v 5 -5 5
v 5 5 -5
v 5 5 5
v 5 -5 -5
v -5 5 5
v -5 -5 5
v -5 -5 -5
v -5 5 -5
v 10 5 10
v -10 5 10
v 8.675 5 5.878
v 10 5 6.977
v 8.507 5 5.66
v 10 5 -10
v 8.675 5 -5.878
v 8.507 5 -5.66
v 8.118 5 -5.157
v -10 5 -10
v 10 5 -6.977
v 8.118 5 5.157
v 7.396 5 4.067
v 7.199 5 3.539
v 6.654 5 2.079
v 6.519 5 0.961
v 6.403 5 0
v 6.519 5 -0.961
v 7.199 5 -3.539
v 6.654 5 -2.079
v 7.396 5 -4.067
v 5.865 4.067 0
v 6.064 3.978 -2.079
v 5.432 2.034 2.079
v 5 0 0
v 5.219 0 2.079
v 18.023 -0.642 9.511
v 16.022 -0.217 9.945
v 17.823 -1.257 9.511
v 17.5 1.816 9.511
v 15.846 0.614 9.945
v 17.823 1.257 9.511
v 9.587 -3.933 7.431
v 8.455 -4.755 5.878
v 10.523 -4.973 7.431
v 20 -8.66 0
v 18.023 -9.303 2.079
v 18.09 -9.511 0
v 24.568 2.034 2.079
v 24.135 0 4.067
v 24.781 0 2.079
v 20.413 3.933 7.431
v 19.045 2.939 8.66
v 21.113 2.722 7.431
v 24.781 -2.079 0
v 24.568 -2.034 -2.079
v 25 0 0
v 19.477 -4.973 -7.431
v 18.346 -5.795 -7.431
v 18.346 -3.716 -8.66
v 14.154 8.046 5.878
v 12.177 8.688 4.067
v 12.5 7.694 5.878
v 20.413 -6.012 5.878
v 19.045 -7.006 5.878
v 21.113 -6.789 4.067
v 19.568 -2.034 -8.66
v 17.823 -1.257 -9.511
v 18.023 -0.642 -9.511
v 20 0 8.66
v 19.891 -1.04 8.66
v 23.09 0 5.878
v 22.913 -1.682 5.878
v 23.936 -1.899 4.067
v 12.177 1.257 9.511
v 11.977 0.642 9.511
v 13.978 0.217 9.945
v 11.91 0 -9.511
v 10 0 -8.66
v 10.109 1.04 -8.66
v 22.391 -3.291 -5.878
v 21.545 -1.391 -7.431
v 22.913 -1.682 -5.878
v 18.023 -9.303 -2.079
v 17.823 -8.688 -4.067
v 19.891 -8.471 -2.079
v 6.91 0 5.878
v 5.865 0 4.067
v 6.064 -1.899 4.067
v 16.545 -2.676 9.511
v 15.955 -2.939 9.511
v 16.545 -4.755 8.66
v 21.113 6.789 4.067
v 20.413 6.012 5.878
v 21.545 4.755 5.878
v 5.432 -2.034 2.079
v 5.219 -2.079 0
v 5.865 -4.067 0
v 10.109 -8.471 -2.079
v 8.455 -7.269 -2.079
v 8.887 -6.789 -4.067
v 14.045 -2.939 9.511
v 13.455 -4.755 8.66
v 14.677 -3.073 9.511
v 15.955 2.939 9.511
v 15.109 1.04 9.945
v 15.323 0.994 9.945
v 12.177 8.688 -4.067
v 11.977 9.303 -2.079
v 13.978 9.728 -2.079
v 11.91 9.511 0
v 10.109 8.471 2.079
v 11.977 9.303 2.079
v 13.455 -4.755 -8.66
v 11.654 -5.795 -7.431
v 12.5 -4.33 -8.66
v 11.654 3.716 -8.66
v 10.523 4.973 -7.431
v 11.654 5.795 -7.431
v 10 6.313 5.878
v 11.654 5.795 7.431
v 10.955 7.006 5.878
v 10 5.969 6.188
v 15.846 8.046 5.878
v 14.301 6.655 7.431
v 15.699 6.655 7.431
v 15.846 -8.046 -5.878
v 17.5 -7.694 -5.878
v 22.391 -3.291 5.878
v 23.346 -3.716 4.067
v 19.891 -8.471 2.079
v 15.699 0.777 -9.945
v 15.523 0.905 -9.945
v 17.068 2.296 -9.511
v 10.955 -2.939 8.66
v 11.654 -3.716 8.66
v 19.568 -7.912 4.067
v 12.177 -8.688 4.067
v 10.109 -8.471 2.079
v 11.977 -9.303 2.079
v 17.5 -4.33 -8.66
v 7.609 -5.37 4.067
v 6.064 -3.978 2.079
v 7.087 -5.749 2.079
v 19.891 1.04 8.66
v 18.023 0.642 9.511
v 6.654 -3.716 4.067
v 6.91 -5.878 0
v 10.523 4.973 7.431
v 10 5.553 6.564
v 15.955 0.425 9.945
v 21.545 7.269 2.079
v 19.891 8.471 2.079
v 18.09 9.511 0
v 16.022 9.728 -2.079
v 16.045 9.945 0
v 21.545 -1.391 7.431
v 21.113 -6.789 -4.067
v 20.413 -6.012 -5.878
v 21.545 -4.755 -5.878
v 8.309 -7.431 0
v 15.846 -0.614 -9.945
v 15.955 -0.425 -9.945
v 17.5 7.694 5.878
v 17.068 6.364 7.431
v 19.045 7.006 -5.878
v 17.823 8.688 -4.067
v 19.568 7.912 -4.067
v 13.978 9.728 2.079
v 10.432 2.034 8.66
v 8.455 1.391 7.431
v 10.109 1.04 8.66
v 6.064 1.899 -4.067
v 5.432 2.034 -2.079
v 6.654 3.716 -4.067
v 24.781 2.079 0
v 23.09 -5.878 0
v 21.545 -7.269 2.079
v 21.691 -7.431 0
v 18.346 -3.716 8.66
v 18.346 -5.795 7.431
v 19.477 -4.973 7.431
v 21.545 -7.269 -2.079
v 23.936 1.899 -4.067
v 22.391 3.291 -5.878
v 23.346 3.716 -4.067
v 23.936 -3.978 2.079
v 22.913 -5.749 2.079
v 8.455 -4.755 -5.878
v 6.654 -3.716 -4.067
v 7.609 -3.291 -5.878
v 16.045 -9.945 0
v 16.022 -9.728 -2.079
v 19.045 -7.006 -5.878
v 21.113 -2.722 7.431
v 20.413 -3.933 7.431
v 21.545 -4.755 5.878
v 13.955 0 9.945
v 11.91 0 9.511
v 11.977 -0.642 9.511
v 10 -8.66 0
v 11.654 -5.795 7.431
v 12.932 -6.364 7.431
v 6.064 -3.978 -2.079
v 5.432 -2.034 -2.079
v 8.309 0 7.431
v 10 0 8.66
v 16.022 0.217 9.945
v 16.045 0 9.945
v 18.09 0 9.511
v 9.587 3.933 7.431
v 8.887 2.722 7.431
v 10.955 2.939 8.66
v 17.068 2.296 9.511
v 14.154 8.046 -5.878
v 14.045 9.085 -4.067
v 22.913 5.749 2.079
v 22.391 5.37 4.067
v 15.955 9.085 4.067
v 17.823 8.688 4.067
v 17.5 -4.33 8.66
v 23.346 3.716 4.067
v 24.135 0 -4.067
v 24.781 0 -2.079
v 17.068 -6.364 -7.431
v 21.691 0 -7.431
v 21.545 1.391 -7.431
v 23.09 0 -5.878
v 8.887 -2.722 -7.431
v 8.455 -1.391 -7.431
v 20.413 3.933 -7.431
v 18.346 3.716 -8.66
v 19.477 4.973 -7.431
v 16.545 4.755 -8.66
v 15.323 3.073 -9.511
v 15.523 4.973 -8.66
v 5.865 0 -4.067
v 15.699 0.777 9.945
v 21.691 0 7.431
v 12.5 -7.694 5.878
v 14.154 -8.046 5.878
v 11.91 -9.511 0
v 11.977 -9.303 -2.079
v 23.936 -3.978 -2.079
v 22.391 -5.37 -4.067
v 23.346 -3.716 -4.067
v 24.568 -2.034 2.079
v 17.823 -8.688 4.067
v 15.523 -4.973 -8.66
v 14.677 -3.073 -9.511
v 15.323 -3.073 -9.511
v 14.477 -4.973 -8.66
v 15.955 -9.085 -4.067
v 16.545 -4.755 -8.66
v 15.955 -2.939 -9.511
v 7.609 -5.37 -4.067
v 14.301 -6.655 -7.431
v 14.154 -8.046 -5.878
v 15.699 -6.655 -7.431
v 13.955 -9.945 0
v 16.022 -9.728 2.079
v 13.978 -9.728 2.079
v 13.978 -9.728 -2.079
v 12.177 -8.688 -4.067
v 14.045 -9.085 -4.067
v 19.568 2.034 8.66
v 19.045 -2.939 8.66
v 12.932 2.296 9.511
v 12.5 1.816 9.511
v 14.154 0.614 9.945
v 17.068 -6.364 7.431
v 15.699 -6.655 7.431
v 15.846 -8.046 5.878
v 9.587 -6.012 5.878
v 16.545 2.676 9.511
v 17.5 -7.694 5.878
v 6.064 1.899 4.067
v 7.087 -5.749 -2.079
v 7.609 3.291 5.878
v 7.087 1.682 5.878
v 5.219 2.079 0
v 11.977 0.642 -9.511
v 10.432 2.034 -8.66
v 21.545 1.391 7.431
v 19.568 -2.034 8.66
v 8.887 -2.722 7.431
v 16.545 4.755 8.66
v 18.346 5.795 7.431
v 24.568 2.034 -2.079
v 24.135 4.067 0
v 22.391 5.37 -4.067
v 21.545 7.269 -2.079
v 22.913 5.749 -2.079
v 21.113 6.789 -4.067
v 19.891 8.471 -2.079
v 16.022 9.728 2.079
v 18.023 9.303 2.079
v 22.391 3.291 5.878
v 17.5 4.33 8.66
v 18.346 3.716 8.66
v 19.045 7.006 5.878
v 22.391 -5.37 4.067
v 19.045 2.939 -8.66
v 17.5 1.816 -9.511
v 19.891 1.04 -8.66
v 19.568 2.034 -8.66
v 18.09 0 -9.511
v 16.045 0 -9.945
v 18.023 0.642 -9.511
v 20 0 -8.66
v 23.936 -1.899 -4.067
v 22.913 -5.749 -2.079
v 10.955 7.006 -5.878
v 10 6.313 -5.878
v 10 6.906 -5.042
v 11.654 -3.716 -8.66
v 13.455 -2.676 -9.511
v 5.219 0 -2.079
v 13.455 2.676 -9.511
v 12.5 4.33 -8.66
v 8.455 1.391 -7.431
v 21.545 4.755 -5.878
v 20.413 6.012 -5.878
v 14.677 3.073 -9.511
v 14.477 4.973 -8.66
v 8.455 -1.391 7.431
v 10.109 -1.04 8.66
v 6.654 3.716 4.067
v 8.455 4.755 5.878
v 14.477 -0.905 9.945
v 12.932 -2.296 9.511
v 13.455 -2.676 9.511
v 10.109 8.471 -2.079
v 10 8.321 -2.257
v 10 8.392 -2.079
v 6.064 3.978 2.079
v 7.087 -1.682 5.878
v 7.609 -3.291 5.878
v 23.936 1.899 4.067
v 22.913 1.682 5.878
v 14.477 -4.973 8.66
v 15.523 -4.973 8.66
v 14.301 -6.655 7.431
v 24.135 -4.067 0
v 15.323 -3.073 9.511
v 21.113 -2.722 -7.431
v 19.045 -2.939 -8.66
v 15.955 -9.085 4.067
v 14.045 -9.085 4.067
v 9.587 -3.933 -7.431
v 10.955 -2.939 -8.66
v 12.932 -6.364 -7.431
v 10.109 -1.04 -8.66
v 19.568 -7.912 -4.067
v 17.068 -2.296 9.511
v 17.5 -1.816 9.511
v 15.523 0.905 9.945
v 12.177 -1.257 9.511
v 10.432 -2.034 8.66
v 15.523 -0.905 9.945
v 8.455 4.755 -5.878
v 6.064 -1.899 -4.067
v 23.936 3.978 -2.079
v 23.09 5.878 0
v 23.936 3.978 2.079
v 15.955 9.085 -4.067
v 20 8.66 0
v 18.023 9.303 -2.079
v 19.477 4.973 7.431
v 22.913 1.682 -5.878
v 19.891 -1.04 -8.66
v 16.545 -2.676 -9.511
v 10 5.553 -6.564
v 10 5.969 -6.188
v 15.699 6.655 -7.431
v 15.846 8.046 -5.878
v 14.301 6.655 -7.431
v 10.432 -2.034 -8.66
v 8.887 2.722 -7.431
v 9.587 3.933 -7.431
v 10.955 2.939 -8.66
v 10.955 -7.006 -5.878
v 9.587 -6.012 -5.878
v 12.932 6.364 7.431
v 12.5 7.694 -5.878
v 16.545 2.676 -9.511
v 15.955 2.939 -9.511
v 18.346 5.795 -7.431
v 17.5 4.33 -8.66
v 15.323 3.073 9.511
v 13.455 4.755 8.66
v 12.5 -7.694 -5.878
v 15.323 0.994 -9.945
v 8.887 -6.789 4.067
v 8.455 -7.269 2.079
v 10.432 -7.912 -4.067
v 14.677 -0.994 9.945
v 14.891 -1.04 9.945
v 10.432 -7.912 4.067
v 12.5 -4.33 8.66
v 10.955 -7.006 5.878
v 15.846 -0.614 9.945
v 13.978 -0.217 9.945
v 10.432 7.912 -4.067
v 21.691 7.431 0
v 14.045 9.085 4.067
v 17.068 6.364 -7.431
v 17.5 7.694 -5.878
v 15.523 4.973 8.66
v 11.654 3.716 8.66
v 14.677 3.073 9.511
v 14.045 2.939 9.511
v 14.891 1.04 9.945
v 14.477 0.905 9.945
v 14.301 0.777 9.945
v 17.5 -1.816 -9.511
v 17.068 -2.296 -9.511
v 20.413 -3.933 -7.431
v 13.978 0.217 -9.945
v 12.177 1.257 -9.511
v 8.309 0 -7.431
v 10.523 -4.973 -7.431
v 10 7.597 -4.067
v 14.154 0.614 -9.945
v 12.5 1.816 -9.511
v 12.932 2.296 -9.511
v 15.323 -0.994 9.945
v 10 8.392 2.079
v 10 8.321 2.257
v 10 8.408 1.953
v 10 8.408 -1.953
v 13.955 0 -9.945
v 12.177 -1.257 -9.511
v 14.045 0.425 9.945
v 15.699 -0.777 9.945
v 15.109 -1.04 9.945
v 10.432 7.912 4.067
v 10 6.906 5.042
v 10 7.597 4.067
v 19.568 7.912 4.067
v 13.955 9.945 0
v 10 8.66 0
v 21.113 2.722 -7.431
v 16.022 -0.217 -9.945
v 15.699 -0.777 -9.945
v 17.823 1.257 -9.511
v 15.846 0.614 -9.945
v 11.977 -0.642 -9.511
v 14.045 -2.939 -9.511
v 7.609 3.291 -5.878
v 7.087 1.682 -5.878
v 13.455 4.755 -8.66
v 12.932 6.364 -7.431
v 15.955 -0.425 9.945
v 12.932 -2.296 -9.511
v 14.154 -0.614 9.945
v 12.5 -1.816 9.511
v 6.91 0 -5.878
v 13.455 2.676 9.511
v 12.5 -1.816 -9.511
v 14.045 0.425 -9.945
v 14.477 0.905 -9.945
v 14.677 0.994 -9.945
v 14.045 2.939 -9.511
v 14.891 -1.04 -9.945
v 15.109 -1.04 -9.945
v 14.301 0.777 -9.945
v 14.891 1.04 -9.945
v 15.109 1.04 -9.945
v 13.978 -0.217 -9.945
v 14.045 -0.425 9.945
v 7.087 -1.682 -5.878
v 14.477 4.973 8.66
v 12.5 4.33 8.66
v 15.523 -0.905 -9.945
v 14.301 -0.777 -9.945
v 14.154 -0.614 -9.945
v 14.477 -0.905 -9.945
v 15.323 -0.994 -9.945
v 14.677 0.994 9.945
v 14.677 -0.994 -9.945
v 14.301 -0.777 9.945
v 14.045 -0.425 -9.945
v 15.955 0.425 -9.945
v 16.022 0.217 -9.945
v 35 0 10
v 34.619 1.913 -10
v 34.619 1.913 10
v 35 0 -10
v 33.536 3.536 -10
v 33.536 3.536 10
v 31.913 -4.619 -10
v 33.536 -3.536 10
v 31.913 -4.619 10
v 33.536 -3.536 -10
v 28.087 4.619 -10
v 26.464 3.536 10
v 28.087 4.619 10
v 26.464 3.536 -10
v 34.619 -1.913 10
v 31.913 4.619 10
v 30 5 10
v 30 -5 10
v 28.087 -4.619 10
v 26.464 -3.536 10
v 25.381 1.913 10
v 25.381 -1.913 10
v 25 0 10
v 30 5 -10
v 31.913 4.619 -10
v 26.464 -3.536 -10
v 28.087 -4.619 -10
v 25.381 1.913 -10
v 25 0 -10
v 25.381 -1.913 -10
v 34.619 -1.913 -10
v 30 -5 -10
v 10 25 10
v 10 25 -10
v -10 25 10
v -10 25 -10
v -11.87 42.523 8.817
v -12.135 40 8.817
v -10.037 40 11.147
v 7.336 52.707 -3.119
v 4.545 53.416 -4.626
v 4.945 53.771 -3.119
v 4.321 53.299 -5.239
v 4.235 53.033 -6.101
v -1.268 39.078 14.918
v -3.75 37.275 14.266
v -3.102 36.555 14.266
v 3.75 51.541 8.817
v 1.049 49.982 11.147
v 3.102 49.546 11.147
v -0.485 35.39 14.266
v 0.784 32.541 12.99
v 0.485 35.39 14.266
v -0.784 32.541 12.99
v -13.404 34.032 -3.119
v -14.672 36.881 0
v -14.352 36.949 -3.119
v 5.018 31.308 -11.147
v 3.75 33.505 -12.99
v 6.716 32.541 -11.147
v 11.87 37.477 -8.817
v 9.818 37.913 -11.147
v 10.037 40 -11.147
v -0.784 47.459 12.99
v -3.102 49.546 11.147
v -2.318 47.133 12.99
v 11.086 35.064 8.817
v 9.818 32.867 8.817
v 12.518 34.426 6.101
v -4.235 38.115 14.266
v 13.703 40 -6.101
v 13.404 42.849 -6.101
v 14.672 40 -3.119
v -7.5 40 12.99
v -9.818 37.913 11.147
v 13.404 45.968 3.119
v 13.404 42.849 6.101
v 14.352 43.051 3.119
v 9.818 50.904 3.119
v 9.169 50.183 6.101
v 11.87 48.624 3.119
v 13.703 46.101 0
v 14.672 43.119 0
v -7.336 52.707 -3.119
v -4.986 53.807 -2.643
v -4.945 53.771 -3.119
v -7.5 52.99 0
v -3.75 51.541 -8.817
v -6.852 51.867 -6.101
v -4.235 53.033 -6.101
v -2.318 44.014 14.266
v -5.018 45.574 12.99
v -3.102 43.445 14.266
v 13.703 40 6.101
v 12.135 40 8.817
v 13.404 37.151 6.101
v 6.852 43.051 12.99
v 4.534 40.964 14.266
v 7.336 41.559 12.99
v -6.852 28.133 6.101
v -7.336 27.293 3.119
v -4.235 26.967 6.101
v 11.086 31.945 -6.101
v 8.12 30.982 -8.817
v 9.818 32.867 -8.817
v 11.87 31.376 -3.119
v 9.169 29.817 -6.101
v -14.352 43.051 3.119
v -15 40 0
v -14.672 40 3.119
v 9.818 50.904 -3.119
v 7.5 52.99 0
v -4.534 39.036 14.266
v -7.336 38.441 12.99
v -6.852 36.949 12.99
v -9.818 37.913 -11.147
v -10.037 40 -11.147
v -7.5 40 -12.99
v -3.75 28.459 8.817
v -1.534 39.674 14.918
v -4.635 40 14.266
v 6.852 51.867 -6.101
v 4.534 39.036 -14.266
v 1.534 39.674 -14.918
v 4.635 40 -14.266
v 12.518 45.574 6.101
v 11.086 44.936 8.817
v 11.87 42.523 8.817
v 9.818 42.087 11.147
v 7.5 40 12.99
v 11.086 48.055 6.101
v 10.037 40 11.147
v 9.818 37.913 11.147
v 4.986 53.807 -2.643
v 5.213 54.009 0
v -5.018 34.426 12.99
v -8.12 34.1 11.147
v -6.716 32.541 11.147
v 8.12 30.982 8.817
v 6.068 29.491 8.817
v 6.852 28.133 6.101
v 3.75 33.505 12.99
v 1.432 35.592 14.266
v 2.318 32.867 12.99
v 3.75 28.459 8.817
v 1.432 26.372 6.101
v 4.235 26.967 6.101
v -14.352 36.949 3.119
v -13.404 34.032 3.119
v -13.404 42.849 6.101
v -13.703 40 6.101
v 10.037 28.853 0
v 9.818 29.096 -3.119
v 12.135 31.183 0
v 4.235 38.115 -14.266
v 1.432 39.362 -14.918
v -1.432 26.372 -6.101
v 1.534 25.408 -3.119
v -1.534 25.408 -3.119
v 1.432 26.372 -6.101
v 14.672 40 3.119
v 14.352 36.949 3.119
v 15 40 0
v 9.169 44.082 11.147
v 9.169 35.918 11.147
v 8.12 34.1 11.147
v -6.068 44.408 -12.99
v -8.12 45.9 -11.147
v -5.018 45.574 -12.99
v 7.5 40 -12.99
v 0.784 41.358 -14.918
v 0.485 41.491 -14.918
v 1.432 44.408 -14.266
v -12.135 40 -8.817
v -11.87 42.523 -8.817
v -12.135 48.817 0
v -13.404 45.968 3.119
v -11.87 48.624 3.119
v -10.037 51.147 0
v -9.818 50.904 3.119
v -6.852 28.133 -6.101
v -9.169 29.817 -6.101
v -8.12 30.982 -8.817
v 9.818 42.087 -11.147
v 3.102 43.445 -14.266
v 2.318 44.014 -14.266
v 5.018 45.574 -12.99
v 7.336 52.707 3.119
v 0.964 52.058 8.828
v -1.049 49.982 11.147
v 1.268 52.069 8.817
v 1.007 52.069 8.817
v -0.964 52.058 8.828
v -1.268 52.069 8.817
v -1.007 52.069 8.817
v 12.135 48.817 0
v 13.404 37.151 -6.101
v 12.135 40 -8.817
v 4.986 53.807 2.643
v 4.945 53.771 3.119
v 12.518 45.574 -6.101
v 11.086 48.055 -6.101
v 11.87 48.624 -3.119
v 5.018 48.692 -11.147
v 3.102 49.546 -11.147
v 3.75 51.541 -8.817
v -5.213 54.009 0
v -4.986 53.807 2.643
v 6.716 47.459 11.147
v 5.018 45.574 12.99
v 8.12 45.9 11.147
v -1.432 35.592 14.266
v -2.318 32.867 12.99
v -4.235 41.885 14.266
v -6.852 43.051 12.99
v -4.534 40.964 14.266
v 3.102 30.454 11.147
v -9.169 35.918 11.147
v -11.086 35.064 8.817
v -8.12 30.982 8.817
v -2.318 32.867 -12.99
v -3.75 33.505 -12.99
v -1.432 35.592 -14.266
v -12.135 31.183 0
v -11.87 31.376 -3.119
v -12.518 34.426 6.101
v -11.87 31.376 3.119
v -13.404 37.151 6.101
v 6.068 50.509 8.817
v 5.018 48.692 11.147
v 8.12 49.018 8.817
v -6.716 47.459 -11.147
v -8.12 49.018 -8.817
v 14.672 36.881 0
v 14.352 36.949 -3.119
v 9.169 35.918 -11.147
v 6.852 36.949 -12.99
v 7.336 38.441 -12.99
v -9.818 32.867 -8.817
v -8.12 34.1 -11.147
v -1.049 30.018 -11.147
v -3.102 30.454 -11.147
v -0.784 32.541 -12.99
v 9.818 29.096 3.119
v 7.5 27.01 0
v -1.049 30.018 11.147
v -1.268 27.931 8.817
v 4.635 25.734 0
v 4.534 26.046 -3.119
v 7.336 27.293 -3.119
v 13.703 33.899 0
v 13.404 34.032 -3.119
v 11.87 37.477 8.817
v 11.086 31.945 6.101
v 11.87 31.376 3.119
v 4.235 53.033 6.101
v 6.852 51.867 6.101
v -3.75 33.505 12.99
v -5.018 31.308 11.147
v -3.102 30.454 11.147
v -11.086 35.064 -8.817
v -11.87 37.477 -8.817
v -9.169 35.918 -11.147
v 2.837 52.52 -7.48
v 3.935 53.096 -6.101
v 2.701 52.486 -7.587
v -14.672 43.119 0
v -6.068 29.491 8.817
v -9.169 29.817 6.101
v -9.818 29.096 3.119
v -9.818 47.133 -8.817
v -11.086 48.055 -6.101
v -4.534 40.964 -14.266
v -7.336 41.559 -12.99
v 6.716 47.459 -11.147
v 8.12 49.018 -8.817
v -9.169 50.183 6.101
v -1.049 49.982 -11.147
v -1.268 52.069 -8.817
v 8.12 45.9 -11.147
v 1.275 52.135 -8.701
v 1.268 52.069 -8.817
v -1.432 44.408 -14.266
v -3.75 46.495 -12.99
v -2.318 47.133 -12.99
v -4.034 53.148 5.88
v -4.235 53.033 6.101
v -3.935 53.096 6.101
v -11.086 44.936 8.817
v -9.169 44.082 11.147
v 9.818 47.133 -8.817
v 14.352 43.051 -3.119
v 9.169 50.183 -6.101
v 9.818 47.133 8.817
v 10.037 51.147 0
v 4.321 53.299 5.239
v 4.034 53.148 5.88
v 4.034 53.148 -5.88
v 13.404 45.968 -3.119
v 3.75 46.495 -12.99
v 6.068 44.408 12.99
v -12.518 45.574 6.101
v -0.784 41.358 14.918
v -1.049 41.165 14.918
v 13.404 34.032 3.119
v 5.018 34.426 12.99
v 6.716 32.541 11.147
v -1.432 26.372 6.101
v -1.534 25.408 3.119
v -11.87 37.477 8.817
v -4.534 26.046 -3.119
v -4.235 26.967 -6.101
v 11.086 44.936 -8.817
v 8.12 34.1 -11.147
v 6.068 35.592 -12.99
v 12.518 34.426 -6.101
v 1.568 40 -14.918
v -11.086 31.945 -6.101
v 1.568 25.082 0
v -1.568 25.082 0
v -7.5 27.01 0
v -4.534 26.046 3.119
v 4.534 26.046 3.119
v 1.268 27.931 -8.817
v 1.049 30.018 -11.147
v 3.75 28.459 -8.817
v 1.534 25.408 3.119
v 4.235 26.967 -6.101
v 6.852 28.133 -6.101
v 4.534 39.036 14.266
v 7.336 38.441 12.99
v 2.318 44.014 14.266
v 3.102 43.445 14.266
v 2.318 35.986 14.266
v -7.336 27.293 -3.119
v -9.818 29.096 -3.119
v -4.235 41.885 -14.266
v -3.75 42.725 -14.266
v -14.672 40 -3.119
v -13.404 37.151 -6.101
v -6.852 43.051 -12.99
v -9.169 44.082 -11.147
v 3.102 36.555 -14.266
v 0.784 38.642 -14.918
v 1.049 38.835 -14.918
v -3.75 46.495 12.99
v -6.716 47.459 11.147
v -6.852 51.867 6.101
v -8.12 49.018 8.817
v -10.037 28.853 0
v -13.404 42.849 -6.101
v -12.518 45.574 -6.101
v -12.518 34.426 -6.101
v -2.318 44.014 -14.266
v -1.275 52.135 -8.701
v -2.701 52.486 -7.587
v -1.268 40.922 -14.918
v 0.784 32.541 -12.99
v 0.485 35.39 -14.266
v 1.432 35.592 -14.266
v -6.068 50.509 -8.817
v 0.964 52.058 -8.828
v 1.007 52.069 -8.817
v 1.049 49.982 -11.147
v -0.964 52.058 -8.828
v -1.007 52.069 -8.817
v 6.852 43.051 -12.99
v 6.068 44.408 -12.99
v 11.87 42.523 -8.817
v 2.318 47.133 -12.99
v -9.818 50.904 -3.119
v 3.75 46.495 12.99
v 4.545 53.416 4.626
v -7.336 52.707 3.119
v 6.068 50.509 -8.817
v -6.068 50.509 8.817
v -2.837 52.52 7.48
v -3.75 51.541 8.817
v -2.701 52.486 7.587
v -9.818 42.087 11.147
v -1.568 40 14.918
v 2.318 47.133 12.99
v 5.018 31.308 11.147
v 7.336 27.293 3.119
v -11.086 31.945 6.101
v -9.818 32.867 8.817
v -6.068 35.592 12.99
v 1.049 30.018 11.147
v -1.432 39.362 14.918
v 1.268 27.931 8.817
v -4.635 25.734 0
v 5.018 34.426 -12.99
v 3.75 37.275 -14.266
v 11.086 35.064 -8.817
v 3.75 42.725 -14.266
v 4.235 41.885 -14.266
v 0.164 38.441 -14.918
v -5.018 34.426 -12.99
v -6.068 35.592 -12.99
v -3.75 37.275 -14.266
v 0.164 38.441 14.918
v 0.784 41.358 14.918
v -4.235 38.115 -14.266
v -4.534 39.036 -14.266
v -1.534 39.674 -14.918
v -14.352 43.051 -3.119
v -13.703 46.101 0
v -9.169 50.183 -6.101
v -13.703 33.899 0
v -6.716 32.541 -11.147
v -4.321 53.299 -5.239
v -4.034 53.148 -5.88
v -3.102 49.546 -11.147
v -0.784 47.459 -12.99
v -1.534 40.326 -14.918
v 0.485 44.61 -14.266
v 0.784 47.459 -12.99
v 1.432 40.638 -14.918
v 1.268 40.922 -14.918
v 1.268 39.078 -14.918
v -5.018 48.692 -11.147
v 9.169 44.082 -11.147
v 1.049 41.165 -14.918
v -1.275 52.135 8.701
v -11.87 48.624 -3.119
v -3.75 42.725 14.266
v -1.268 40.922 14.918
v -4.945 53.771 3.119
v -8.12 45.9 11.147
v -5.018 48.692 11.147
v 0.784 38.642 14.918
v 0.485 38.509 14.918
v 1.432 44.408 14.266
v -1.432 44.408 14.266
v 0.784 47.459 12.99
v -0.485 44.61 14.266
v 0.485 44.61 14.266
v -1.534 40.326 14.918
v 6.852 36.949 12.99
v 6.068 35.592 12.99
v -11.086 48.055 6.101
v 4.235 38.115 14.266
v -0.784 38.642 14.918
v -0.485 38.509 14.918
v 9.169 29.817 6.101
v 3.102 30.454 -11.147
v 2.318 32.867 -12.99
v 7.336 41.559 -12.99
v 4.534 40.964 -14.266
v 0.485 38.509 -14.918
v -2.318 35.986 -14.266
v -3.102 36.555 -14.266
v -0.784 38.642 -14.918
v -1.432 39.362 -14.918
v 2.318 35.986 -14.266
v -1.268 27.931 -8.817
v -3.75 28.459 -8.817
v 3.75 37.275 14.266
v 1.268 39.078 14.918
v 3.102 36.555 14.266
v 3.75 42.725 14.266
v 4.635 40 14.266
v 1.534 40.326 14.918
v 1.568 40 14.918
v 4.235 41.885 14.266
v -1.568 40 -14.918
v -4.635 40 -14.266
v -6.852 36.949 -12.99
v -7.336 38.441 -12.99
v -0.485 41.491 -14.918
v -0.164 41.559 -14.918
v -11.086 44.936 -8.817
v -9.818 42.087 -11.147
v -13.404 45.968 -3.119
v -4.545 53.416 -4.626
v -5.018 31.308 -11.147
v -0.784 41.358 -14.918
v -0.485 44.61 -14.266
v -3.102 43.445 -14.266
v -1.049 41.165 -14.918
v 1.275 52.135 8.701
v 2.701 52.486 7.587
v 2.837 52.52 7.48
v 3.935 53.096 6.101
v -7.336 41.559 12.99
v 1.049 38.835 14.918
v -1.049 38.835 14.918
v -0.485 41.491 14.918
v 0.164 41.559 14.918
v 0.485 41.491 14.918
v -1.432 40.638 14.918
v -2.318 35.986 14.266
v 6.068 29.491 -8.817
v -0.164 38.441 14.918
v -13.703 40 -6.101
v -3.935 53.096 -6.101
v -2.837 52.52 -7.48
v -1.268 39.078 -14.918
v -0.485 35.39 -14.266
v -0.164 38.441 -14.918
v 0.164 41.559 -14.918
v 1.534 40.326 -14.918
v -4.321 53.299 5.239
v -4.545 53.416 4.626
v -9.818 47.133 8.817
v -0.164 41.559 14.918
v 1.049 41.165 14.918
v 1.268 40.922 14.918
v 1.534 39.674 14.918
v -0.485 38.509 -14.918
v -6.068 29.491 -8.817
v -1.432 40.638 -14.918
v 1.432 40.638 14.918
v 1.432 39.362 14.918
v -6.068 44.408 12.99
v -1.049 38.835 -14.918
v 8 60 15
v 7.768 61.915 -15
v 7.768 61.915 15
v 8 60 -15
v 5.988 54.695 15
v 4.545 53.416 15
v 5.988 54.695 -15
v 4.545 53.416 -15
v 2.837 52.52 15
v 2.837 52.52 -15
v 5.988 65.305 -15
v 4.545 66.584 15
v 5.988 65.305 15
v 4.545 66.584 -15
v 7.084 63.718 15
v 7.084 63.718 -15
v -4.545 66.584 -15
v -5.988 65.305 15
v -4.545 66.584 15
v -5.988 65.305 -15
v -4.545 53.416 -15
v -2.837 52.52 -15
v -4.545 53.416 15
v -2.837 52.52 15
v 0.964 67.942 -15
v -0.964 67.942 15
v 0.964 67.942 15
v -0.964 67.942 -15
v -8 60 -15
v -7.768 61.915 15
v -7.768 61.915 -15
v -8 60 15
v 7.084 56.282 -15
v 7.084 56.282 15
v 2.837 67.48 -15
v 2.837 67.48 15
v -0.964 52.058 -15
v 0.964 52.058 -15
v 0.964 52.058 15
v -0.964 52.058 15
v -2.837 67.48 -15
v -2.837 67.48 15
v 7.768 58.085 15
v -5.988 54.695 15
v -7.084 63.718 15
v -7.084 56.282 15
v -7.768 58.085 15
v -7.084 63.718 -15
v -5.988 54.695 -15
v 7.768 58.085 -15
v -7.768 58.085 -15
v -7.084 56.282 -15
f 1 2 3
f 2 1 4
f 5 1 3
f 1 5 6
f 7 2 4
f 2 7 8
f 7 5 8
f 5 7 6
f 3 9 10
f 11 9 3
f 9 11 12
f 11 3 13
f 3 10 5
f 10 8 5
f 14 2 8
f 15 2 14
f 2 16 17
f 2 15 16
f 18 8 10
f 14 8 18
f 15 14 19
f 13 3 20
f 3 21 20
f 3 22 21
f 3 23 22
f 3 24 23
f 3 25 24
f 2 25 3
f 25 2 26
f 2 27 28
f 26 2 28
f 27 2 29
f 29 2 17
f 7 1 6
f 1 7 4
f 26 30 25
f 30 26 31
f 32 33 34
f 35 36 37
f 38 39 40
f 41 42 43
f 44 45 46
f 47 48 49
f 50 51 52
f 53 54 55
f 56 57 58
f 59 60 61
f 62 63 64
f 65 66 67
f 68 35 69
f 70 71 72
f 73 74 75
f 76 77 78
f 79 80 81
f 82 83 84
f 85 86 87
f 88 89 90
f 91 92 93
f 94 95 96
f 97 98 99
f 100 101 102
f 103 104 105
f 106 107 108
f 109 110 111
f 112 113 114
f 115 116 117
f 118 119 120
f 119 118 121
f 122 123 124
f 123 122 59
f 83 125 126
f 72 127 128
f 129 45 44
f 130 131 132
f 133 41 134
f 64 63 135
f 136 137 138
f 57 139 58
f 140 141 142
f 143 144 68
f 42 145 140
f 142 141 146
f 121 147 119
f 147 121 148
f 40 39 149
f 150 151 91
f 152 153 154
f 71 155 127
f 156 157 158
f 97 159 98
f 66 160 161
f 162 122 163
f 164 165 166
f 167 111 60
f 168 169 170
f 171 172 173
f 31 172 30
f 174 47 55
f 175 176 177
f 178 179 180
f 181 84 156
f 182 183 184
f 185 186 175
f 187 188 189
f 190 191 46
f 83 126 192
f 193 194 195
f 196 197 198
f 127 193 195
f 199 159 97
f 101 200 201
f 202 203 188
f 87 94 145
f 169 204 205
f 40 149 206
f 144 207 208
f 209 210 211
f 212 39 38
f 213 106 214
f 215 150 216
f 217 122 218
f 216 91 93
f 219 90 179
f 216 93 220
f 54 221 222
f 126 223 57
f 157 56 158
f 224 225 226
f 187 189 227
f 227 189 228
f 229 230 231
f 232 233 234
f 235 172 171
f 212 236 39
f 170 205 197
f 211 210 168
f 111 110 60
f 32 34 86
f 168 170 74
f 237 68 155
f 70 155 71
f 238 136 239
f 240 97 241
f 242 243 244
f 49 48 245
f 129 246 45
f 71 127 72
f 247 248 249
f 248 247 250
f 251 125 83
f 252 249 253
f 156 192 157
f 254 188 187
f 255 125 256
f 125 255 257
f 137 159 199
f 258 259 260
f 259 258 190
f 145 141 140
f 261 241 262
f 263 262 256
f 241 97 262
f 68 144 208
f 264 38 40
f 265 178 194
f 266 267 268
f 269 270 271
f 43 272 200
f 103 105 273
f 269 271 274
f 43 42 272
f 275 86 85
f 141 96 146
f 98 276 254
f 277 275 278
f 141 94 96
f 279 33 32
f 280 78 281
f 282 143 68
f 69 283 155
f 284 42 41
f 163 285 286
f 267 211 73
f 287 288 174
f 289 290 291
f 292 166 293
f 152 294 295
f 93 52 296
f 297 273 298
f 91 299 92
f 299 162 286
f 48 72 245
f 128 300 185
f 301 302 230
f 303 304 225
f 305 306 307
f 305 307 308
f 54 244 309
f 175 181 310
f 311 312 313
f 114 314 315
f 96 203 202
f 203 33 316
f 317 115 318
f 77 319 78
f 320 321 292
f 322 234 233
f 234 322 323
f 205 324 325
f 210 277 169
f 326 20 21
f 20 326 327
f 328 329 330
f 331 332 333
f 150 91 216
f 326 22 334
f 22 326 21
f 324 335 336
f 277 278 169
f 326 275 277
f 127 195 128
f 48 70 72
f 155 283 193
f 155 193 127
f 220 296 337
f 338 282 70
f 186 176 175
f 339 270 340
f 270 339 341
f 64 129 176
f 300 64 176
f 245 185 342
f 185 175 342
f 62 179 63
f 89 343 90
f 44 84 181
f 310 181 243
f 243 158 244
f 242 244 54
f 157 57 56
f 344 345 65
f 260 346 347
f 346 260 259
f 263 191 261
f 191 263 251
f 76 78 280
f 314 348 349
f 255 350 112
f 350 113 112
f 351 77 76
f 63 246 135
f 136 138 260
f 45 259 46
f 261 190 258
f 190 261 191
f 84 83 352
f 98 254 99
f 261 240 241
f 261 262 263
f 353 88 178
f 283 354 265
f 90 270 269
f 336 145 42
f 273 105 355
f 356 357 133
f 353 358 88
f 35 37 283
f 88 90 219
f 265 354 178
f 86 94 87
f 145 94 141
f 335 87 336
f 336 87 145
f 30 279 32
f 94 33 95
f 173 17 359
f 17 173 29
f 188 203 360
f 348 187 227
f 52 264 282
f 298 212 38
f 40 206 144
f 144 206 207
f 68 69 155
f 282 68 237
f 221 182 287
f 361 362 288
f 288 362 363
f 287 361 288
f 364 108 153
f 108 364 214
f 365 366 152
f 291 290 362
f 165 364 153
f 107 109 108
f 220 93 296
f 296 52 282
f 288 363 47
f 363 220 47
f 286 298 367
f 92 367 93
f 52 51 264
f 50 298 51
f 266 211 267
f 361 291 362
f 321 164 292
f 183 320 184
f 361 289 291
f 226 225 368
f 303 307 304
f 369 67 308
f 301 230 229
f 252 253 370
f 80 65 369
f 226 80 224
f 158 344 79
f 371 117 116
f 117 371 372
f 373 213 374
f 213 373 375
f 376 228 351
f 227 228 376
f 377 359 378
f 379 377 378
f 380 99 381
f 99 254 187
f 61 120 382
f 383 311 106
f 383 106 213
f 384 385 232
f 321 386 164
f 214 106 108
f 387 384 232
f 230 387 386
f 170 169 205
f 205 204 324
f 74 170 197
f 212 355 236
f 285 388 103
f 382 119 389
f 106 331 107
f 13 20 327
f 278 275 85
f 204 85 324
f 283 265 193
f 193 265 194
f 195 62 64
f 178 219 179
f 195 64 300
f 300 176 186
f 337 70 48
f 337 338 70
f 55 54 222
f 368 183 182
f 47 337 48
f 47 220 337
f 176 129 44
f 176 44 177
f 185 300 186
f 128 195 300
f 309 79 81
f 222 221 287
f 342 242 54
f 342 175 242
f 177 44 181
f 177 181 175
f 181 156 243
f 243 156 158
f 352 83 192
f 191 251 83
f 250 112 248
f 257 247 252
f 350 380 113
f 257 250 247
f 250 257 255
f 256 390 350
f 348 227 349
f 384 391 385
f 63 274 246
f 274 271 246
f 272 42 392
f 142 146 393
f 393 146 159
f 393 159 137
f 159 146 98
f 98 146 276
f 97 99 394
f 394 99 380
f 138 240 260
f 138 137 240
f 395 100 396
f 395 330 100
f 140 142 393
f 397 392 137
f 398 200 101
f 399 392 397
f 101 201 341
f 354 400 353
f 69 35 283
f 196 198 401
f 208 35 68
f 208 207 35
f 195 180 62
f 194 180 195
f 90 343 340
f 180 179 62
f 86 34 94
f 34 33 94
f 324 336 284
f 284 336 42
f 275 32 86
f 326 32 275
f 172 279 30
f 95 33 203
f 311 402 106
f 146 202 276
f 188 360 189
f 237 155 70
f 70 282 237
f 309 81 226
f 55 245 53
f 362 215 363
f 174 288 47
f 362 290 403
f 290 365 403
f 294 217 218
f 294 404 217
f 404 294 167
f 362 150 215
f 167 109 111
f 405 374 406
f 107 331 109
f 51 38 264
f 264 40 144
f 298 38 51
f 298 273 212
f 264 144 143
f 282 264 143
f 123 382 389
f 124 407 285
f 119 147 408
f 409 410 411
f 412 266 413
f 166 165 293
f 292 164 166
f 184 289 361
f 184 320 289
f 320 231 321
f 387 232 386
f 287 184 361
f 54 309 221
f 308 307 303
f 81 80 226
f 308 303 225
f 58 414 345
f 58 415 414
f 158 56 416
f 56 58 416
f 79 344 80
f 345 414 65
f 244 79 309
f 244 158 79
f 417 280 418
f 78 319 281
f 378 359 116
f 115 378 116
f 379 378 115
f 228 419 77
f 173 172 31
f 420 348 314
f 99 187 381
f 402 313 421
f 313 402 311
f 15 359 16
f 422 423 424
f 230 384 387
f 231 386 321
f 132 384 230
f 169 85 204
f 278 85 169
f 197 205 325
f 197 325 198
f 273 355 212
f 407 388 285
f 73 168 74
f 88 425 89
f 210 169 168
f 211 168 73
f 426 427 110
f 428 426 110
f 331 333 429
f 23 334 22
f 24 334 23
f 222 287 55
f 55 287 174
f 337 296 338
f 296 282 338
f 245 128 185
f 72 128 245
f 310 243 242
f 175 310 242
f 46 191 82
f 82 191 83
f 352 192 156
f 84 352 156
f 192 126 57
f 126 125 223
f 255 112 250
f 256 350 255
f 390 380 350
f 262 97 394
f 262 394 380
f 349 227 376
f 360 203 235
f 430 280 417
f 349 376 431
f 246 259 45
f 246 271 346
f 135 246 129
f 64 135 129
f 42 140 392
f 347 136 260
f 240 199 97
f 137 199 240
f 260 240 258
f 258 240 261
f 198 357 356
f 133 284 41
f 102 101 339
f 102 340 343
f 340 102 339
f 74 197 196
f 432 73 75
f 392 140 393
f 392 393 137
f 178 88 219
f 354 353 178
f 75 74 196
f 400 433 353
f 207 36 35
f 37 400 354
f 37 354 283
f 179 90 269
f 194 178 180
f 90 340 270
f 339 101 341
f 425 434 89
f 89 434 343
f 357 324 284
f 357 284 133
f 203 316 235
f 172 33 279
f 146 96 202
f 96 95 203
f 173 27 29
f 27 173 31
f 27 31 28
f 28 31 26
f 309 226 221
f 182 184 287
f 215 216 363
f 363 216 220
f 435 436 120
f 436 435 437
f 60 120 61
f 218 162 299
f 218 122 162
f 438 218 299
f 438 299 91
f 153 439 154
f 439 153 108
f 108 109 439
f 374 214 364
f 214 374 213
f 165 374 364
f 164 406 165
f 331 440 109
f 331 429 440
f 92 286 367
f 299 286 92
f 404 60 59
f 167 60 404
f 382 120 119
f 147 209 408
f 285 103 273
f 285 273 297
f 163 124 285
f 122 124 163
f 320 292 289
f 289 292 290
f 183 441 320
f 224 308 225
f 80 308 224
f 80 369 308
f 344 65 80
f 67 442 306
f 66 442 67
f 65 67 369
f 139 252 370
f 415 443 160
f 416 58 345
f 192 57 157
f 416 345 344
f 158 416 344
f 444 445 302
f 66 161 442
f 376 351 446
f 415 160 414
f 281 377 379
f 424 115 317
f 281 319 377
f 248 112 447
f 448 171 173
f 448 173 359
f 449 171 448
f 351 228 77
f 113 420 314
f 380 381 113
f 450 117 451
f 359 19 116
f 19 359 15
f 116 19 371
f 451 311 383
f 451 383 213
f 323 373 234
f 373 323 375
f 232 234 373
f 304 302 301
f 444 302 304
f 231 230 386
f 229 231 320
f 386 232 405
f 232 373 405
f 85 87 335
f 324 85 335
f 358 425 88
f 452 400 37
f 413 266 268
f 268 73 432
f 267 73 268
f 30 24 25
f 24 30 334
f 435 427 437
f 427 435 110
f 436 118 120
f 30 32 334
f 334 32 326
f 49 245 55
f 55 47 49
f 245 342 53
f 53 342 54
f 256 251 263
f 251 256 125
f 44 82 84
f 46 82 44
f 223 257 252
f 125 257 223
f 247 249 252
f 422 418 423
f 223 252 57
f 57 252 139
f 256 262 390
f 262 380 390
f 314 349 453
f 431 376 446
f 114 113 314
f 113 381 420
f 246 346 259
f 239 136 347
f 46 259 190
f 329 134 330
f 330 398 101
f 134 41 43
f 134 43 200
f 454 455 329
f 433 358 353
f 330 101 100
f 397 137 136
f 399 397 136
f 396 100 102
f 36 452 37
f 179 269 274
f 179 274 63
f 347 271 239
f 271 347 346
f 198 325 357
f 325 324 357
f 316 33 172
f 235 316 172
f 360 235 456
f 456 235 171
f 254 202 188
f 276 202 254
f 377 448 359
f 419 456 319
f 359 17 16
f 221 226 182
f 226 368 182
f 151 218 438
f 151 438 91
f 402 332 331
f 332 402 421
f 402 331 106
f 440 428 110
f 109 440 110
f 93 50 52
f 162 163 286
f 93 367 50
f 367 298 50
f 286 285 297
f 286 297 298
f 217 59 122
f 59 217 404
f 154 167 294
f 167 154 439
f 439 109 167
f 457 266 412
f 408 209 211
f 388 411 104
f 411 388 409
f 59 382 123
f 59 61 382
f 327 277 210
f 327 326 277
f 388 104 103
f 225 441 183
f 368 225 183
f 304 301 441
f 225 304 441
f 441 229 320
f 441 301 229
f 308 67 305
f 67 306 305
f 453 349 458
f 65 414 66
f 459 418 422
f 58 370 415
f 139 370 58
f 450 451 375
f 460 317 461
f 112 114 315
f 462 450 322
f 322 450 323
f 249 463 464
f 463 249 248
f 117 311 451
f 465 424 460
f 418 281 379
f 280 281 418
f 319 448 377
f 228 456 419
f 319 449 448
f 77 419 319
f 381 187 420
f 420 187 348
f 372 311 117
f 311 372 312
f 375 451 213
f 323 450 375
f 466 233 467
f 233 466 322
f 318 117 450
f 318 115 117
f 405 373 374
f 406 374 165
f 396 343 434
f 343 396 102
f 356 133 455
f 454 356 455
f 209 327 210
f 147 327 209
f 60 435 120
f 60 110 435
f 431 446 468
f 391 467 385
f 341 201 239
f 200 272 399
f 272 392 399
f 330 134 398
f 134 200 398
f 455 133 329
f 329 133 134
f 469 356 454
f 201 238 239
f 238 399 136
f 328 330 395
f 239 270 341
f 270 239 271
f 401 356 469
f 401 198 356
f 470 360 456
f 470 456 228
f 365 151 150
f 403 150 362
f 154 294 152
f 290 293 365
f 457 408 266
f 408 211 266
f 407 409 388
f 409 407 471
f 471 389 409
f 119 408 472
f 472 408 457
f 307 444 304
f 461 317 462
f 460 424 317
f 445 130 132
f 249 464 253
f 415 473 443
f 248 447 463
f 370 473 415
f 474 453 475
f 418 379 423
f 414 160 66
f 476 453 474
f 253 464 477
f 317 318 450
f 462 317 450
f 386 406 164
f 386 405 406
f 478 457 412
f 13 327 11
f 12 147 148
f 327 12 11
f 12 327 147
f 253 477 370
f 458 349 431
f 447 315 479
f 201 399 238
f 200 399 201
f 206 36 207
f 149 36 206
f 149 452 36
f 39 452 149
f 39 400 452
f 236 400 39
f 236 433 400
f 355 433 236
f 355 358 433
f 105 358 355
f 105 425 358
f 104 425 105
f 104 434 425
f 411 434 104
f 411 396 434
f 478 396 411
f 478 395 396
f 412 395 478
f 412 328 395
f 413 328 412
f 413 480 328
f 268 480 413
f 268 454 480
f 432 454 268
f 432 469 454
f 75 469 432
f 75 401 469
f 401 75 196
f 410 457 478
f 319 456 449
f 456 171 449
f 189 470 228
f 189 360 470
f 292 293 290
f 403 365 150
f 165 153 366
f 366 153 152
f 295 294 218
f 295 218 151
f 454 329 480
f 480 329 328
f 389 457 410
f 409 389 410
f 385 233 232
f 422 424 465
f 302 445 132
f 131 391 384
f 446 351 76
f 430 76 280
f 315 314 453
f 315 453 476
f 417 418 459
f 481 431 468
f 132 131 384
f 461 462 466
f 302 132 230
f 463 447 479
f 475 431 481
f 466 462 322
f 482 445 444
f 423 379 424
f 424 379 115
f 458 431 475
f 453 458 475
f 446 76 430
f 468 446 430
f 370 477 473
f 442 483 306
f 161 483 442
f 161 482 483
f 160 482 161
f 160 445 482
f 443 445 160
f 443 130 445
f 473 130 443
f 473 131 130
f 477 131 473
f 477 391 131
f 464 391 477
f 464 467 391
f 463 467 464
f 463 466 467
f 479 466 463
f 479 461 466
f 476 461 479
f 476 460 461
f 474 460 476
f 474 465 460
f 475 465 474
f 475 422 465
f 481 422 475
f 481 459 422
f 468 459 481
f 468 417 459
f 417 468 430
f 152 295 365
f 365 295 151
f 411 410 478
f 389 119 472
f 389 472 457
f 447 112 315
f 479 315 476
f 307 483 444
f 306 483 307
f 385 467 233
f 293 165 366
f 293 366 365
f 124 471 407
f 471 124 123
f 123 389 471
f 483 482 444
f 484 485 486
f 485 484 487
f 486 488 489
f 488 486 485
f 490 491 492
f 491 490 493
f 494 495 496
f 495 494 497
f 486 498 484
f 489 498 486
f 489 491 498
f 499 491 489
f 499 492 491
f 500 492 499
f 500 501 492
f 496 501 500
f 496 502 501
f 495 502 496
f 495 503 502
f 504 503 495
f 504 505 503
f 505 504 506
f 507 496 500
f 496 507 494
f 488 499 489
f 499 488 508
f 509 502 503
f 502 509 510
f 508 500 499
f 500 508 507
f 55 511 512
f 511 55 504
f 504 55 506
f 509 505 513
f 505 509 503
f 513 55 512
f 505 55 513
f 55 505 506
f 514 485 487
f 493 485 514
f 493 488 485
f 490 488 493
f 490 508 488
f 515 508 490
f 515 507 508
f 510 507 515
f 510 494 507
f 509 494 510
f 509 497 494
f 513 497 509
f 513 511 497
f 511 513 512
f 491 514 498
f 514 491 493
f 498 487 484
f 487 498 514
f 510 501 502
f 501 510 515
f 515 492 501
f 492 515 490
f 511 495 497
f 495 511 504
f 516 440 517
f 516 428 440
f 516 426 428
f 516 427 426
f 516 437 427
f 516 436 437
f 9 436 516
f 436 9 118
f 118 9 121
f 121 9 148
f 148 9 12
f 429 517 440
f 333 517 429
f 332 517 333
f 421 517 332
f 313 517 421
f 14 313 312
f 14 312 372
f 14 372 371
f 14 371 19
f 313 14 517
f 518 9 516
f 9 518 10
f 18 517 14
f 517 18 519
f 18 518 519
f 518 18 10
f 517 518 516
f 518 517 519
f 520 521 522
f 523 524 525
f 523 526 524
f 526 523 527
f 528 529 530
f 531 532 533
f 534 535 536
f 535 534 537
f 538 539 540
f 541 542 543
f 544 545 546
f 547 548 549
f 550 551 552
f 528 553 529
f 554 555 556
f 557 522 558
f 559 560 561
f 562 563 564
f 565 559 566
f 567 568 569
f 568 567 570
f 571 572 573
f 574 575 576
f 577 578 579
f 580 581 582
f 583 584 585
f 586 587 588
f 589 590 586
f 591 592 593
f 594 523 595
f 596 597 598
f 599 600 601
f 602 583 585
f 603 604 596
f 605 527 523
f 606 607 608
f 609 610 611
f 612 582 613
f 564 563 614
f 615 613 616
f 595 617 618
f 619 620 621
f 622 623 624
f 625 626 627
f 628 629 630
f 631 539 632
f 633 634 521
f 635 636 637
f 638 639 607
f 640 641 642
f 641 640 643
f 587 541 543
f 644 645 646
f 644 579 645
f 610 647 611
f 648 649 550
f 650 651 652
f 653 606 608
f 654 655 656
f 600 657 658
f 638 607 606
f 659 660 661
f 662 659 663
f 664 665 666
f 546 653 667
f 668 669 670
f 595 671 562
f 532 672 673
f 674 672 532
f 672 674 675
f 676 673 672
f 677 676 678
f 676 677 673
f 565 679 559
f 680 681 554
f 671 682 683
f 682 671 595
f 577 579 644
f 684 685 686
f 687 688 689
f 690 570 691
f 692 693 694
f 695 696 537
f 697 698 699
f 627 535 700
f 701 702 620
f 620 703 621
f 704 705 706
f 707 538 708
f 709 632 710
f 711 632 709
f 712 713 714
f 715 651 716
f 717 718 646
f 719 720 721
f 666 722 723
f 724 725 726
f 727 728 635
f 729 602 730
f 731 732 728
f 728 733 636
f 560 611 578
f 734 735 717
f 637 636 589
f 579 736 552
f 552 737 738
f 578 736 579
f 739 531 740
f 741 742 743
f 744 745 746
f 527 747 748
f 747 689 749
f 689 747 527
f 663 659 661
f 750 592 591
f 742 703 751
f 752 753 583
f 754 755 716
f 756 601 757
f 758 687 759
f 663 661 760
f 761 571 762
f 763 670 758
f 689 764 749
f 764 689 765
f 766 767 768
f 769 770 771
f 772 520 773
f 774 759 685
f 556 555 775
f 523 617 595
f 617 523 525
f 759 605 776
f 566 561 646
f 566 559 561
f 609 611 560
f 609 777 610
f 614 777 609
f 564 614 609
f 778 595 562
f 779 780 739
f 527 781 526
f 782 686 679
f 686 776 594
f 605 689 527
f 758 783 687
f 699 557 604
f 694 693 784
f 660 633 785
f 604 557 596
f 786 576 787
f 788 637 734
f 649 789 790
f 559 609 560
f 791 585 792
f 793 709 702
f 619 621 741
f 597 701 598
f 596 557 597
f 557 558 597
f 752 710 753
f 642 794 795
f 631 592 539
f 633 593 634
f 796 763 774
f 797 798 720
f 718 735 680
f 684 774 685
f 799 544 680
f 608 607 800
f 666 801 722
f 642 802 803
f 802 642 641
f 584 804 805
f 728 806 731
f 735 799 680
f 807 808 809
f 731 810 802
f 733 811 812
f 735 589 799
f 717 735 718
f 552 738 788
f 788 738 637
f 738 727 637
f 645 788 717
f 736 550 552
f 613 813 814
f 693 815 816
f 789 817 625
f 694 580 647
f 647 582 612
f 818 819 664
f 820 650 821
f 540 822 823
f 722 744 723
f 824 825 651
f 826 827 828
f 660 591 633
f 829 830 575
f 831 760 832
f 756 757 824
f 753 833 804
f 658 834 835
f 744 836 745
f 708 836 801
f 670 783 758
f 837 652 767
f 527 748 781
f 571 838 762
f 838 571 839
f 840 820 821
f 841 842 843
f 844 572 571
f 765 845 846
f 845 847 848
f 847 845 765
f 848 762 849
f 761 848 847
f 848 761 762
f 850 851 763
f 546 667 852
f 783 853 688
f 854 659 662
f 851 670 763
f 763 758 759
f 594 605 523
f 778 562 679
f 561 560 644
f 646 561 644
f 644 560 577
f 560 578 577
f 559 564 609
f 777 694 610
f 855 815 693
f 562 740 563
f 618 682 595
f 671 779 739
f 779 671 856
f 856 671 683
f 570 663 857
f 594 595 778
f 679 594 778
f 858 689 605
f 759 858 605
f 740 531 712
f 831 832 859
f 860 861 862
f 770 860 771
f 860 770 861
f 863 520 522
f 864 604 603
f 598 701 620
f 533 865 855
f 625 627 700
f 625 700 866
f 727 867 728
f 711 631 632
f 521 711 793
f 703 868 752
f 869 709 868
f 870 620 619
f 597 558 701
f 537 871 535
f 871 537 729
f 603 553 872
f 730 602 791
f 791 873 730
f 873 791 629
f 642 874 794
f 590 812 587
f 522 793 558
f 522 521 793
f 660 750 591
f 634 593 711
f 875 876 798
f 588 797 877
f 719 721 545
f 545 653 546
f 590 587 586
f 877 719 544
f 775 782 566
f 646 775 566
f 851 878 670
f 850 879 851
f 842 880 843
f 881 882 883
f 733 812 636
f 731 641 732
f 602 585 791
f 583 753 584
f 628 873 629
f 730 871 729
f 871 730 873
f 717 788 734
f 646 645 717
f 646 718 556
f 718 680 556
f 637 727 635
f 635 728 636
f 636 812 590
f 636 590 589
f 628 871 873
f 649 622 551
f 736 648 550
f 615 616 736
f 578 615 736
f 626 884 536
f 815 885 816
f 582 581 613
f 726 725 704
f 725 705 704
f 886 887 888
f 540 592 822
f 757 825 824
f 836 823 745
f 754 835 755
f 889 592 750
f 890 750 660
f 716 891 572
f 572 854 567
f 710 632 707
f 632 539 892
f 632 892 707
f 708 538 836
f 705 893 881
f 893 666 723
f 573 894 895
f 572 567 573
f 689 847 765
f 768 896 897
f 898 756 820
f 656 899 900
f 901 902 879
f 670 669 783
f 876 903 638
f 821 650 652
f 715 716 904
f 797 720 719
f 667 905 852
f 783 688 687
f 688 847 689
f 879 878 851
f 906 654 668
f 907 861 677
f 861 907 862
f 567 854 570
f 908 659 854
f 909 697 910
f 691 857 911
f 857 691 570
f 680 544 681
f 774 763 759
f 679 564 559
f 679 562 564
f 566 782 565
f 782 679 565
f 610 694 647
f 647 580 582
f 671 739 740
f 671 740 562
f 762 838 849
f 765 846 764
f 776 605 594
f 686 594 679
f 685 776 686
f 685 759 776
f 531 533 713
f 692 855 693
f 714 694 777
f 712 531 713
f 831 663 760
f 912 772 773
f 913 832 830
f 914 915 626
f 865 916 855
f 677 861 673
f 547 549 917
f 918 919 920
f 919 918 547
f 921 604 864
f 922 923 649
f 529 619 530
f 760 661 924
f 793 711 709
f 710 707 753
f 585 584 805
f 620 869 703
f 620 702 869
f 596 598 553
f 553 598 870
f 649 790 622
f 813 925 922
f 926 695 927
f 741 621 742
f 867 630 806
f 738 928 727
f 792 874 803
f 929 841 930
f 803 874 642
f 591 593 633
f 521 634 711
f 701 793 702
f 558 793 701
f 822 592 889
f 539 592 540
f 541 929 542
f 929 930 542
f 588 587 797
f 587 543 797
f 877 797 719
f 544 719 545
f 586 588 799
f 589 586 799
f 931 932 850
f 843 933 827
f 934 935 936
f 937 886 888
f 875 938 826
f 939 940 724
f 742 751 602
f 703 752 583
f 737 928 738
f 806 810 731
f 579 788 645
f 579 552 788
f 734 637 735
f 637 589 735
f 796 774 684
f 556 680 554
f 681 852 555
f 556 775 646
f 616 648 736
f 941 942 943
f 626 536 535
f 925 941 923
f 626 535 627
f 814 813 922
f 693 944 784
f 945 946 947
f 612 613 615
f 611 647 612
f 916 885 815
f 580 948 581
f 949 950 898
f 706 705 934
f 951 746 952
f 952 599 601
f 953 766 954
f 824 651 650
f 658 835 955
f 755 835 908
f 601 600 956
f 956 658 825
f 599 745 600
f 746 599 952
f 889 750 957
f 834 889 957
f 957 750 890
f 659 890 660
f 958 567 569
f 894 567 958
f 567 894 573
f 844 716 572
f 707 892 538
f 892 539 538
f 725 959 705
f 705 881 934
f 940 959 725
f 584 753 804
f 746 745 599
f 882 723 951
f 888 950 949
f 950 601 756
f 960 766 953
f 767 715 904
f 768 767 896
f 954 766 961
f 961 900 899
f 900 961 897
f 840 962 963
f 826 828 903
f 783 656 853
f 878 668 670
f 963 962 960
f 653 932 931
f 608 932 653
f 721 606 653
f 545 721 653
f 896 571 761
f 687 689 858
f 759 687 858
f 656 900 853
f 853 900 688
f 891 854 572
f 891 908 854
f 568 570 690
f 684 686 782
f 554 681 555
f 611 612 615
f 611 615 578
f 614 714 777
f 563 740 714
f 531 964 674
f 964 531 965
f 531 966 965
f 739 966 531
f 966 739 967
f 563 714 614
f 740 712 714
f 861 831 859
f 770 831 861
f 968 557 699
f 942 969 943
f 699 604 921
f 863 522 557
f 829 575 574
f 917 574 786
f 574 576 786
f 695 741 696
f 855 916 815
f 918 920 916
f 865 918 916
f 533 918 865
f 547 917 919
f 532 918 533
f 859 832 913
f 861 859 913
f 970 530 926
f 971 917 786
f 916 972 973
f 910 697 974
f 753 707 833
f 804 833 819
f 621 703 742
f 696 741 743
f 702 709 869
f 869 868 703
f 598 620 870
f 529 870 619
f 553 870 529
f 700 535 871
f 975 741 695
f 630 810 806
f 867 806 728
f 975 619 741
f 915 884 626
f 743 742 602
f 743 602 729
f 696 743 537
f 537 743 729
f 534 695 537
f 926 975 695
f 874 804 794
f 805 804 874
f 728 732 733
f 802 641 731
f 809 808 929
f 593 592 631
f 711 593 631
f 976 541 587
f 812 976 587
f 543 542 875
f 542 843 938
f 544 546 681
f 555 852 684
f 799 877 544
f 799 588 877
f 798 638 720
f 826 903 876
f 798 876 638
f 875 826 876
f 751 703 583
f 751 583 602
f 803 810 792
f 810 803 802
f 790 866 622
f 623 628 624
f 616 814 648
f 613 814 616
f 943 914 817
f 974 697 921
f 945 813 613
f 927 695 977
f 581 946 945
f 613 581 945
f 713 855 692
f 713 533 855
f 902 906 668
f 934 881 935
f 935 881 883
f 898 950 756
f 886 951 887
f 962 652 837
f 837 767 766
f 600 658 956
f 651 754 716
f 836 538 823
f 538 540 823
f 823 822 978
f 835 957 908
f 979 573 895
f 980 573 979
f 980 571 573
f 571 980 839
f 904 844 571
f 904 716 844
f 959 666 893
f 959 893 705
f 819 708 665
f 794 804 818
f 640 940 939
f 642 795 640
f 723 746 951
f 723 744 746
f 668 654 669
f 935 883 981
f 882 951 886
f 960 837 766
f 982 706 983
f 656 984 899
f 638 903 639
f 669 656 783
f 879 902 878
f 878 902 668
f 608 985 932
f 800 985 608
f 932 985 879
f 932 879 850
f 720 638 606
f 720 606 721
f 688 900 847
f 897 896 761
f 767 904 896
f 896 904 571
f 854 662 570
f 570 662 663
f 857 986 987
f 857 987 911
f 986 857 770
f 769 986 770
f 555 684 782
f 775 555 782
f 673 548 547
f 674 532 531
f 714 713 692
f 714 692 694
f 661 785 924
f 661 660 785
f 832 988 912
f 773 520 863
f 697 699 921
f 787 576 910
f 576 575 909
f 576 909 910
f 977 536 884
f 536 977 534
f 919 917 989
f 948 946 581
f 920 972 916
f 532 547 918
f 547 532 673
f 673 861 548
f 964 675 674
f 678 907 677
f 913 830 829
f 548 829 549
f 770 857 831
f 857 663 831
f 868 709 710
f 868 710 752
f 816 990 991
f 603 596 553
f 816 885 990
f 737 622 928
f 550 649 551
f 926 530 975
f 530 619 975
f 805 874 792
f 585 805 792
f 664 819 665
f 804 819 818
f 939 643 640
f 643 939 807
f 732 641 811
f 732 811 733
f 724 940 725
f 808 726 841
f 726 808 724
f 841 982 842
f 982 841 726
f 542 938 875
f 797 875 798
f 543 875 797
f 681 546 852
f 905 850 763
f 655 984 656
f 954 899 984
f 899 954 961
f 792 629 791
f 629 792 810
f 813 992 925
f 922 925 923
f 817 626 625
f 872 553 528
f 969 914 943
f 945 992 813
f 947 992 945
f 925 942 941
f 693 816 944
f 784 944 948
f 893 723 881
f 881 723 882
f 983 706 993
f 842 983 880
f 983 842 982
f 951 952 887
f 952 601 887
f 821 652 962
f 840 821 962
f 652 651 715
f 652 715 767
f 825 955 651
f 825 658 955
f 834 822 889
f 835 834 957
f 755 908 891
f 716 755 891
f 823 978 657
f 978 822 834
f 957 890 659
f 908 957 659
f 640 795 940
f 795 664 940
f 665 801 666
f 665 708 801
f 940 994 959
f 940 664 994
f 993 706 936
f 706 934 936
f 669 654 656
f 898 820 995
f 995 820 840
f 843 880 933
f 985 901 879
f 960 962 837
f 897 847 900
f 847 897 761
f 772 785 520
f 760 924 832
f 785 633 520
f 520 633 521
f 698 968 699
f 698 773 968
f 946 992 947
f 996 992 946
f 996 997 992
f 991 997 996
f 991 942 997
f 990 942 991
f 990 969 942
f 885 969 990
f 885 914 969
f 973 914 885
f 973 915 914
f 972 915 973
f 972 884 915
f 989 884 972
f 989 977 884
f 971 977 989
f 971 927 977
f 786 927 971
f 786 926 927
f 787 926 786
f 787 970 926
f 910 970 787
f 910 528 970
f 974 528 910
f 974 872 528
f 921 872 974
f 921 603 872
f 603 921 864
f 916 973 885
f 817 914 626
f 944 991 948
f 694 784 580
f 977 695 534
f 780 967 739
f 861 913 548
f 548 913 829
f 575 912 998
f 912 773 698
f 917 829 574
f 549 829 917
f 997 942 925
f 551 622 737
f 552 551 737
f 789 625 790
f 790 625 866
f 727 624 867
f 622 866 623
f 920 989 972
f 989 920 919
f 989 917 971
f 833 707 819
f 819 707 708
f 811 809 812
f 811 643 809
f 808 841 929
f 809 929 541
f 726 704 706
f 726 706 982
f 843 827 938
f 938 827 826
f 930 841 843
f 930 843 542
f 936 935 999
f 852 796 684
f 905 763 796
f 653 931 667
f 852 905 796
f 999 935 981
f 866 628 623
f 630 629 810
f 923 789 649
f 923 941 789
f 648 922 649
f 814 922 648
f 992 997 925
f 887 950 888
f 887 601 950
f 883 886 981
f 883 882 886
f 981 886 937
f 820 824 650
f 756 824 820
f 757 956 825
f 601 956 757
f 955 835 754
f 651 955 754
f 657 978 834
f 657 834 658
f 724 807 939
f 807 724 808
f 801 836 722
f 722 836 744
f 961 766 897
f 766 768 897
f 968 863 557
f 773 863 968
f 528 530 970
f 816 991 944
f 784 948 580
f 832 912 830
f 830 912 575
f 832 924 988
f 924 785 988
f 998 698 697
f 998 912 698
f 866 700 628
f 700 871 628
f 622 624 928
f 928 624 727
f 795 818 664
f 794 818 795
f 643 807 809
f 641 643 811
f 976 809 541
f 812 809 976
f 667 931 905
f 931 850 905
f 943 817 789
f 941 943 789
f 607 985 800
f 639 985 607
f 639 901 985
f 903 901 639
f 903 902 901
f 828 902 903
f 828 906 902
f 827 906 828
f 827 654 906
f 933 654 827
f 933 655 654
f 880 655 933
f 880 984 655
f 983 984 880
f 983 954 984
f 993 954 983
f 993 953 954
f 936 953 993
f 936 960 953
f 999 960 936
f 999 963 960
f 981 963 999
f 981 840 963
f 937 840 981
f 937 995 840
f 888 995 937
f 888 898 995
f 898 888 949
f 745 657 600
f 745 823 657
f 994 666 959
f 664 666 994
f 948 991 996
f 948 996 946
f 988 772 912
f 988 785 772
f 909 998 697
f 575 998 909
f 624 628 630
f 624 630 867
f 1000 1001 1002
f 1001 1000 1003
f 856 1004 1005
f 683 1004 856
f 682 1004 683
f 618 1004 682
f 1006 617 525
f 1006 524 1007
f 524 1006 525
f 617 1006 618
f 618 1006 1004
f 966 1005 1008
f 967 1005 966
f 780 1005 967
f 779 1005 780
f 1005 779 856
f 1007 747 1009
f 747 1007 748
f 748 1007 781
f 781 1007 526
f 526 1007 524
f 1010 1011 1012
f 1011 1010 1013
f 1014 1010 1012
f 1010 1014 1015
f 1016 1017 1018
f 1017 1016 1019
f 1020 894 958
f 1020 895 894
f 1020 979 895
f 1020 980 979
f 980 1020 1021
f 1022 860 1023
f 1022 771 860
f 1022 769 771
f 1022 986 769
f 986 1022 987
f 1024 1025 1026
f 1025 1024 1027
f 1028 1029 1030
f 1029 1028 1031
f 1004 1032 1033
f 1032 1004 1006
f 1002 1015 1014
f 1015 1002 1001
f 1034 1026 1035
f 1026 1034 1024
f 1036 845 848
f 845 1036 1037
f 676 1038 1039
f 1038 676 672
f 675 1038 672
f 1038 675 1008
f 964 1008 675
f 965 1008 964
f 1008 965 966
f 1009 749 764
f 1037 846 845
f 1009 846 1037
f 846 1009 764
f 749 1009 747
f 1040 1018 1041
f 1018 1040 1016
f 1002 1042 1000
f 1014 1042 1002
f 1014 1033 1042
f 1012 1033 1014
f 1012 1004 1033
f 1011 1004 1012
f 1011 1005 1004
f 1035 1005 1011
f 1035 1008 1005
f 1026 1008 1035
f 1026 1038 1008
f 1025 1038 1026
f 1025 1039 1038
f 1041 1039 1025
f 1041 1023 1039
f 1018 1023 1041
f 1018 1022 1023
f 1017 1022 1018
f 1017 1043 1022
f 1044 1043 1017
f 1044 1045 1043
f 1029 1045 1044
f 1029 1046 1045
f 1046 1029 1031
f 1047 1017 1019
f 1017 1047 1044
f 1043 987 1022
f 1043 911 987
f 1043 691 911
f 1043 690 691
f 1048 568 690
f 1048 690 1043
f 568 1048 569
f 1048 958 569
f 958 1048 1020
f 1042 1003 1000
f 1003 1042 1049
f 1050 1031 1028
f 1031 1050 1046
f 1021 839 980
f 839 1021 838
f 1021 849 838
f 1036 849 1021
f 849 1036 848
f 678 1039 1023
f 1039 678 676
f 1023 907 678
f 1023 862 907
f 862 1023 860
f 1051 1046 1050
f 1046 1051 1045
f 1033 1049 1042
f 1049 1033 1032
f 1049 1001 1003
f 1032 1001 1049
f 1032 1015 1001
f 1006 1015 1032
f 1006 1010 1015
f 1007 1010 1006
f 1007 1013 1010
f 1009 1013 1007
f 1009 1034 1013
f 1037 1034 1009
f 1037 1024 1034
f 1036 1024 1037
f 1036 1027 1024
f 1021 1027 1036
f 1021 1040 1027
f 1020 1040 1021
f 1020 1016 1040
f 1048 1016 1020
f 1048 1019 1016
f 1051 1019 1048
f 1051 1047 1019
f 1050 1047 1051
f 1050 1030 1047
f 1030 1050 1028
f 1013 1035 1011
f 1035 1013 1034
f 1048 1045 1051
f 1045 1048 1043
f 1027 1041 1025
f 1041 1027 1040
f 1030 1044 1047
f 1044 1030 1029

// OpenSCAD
// Centered primitives test
union() {
    cube([10, 10, 10], center=true);
    translate([15, 0, 0]) sphere(r=10);
    translate([30, 0, 0]) cylinder(h=20, r=5, center=true);
    translate([0, 15, 0]) cube([20, 20, 20], center=true);
    translate([0, 40, 0]) sphere(r=15);
    translate([0, 60, 0]) cylinder(h=30, r=8, center=true);
}
